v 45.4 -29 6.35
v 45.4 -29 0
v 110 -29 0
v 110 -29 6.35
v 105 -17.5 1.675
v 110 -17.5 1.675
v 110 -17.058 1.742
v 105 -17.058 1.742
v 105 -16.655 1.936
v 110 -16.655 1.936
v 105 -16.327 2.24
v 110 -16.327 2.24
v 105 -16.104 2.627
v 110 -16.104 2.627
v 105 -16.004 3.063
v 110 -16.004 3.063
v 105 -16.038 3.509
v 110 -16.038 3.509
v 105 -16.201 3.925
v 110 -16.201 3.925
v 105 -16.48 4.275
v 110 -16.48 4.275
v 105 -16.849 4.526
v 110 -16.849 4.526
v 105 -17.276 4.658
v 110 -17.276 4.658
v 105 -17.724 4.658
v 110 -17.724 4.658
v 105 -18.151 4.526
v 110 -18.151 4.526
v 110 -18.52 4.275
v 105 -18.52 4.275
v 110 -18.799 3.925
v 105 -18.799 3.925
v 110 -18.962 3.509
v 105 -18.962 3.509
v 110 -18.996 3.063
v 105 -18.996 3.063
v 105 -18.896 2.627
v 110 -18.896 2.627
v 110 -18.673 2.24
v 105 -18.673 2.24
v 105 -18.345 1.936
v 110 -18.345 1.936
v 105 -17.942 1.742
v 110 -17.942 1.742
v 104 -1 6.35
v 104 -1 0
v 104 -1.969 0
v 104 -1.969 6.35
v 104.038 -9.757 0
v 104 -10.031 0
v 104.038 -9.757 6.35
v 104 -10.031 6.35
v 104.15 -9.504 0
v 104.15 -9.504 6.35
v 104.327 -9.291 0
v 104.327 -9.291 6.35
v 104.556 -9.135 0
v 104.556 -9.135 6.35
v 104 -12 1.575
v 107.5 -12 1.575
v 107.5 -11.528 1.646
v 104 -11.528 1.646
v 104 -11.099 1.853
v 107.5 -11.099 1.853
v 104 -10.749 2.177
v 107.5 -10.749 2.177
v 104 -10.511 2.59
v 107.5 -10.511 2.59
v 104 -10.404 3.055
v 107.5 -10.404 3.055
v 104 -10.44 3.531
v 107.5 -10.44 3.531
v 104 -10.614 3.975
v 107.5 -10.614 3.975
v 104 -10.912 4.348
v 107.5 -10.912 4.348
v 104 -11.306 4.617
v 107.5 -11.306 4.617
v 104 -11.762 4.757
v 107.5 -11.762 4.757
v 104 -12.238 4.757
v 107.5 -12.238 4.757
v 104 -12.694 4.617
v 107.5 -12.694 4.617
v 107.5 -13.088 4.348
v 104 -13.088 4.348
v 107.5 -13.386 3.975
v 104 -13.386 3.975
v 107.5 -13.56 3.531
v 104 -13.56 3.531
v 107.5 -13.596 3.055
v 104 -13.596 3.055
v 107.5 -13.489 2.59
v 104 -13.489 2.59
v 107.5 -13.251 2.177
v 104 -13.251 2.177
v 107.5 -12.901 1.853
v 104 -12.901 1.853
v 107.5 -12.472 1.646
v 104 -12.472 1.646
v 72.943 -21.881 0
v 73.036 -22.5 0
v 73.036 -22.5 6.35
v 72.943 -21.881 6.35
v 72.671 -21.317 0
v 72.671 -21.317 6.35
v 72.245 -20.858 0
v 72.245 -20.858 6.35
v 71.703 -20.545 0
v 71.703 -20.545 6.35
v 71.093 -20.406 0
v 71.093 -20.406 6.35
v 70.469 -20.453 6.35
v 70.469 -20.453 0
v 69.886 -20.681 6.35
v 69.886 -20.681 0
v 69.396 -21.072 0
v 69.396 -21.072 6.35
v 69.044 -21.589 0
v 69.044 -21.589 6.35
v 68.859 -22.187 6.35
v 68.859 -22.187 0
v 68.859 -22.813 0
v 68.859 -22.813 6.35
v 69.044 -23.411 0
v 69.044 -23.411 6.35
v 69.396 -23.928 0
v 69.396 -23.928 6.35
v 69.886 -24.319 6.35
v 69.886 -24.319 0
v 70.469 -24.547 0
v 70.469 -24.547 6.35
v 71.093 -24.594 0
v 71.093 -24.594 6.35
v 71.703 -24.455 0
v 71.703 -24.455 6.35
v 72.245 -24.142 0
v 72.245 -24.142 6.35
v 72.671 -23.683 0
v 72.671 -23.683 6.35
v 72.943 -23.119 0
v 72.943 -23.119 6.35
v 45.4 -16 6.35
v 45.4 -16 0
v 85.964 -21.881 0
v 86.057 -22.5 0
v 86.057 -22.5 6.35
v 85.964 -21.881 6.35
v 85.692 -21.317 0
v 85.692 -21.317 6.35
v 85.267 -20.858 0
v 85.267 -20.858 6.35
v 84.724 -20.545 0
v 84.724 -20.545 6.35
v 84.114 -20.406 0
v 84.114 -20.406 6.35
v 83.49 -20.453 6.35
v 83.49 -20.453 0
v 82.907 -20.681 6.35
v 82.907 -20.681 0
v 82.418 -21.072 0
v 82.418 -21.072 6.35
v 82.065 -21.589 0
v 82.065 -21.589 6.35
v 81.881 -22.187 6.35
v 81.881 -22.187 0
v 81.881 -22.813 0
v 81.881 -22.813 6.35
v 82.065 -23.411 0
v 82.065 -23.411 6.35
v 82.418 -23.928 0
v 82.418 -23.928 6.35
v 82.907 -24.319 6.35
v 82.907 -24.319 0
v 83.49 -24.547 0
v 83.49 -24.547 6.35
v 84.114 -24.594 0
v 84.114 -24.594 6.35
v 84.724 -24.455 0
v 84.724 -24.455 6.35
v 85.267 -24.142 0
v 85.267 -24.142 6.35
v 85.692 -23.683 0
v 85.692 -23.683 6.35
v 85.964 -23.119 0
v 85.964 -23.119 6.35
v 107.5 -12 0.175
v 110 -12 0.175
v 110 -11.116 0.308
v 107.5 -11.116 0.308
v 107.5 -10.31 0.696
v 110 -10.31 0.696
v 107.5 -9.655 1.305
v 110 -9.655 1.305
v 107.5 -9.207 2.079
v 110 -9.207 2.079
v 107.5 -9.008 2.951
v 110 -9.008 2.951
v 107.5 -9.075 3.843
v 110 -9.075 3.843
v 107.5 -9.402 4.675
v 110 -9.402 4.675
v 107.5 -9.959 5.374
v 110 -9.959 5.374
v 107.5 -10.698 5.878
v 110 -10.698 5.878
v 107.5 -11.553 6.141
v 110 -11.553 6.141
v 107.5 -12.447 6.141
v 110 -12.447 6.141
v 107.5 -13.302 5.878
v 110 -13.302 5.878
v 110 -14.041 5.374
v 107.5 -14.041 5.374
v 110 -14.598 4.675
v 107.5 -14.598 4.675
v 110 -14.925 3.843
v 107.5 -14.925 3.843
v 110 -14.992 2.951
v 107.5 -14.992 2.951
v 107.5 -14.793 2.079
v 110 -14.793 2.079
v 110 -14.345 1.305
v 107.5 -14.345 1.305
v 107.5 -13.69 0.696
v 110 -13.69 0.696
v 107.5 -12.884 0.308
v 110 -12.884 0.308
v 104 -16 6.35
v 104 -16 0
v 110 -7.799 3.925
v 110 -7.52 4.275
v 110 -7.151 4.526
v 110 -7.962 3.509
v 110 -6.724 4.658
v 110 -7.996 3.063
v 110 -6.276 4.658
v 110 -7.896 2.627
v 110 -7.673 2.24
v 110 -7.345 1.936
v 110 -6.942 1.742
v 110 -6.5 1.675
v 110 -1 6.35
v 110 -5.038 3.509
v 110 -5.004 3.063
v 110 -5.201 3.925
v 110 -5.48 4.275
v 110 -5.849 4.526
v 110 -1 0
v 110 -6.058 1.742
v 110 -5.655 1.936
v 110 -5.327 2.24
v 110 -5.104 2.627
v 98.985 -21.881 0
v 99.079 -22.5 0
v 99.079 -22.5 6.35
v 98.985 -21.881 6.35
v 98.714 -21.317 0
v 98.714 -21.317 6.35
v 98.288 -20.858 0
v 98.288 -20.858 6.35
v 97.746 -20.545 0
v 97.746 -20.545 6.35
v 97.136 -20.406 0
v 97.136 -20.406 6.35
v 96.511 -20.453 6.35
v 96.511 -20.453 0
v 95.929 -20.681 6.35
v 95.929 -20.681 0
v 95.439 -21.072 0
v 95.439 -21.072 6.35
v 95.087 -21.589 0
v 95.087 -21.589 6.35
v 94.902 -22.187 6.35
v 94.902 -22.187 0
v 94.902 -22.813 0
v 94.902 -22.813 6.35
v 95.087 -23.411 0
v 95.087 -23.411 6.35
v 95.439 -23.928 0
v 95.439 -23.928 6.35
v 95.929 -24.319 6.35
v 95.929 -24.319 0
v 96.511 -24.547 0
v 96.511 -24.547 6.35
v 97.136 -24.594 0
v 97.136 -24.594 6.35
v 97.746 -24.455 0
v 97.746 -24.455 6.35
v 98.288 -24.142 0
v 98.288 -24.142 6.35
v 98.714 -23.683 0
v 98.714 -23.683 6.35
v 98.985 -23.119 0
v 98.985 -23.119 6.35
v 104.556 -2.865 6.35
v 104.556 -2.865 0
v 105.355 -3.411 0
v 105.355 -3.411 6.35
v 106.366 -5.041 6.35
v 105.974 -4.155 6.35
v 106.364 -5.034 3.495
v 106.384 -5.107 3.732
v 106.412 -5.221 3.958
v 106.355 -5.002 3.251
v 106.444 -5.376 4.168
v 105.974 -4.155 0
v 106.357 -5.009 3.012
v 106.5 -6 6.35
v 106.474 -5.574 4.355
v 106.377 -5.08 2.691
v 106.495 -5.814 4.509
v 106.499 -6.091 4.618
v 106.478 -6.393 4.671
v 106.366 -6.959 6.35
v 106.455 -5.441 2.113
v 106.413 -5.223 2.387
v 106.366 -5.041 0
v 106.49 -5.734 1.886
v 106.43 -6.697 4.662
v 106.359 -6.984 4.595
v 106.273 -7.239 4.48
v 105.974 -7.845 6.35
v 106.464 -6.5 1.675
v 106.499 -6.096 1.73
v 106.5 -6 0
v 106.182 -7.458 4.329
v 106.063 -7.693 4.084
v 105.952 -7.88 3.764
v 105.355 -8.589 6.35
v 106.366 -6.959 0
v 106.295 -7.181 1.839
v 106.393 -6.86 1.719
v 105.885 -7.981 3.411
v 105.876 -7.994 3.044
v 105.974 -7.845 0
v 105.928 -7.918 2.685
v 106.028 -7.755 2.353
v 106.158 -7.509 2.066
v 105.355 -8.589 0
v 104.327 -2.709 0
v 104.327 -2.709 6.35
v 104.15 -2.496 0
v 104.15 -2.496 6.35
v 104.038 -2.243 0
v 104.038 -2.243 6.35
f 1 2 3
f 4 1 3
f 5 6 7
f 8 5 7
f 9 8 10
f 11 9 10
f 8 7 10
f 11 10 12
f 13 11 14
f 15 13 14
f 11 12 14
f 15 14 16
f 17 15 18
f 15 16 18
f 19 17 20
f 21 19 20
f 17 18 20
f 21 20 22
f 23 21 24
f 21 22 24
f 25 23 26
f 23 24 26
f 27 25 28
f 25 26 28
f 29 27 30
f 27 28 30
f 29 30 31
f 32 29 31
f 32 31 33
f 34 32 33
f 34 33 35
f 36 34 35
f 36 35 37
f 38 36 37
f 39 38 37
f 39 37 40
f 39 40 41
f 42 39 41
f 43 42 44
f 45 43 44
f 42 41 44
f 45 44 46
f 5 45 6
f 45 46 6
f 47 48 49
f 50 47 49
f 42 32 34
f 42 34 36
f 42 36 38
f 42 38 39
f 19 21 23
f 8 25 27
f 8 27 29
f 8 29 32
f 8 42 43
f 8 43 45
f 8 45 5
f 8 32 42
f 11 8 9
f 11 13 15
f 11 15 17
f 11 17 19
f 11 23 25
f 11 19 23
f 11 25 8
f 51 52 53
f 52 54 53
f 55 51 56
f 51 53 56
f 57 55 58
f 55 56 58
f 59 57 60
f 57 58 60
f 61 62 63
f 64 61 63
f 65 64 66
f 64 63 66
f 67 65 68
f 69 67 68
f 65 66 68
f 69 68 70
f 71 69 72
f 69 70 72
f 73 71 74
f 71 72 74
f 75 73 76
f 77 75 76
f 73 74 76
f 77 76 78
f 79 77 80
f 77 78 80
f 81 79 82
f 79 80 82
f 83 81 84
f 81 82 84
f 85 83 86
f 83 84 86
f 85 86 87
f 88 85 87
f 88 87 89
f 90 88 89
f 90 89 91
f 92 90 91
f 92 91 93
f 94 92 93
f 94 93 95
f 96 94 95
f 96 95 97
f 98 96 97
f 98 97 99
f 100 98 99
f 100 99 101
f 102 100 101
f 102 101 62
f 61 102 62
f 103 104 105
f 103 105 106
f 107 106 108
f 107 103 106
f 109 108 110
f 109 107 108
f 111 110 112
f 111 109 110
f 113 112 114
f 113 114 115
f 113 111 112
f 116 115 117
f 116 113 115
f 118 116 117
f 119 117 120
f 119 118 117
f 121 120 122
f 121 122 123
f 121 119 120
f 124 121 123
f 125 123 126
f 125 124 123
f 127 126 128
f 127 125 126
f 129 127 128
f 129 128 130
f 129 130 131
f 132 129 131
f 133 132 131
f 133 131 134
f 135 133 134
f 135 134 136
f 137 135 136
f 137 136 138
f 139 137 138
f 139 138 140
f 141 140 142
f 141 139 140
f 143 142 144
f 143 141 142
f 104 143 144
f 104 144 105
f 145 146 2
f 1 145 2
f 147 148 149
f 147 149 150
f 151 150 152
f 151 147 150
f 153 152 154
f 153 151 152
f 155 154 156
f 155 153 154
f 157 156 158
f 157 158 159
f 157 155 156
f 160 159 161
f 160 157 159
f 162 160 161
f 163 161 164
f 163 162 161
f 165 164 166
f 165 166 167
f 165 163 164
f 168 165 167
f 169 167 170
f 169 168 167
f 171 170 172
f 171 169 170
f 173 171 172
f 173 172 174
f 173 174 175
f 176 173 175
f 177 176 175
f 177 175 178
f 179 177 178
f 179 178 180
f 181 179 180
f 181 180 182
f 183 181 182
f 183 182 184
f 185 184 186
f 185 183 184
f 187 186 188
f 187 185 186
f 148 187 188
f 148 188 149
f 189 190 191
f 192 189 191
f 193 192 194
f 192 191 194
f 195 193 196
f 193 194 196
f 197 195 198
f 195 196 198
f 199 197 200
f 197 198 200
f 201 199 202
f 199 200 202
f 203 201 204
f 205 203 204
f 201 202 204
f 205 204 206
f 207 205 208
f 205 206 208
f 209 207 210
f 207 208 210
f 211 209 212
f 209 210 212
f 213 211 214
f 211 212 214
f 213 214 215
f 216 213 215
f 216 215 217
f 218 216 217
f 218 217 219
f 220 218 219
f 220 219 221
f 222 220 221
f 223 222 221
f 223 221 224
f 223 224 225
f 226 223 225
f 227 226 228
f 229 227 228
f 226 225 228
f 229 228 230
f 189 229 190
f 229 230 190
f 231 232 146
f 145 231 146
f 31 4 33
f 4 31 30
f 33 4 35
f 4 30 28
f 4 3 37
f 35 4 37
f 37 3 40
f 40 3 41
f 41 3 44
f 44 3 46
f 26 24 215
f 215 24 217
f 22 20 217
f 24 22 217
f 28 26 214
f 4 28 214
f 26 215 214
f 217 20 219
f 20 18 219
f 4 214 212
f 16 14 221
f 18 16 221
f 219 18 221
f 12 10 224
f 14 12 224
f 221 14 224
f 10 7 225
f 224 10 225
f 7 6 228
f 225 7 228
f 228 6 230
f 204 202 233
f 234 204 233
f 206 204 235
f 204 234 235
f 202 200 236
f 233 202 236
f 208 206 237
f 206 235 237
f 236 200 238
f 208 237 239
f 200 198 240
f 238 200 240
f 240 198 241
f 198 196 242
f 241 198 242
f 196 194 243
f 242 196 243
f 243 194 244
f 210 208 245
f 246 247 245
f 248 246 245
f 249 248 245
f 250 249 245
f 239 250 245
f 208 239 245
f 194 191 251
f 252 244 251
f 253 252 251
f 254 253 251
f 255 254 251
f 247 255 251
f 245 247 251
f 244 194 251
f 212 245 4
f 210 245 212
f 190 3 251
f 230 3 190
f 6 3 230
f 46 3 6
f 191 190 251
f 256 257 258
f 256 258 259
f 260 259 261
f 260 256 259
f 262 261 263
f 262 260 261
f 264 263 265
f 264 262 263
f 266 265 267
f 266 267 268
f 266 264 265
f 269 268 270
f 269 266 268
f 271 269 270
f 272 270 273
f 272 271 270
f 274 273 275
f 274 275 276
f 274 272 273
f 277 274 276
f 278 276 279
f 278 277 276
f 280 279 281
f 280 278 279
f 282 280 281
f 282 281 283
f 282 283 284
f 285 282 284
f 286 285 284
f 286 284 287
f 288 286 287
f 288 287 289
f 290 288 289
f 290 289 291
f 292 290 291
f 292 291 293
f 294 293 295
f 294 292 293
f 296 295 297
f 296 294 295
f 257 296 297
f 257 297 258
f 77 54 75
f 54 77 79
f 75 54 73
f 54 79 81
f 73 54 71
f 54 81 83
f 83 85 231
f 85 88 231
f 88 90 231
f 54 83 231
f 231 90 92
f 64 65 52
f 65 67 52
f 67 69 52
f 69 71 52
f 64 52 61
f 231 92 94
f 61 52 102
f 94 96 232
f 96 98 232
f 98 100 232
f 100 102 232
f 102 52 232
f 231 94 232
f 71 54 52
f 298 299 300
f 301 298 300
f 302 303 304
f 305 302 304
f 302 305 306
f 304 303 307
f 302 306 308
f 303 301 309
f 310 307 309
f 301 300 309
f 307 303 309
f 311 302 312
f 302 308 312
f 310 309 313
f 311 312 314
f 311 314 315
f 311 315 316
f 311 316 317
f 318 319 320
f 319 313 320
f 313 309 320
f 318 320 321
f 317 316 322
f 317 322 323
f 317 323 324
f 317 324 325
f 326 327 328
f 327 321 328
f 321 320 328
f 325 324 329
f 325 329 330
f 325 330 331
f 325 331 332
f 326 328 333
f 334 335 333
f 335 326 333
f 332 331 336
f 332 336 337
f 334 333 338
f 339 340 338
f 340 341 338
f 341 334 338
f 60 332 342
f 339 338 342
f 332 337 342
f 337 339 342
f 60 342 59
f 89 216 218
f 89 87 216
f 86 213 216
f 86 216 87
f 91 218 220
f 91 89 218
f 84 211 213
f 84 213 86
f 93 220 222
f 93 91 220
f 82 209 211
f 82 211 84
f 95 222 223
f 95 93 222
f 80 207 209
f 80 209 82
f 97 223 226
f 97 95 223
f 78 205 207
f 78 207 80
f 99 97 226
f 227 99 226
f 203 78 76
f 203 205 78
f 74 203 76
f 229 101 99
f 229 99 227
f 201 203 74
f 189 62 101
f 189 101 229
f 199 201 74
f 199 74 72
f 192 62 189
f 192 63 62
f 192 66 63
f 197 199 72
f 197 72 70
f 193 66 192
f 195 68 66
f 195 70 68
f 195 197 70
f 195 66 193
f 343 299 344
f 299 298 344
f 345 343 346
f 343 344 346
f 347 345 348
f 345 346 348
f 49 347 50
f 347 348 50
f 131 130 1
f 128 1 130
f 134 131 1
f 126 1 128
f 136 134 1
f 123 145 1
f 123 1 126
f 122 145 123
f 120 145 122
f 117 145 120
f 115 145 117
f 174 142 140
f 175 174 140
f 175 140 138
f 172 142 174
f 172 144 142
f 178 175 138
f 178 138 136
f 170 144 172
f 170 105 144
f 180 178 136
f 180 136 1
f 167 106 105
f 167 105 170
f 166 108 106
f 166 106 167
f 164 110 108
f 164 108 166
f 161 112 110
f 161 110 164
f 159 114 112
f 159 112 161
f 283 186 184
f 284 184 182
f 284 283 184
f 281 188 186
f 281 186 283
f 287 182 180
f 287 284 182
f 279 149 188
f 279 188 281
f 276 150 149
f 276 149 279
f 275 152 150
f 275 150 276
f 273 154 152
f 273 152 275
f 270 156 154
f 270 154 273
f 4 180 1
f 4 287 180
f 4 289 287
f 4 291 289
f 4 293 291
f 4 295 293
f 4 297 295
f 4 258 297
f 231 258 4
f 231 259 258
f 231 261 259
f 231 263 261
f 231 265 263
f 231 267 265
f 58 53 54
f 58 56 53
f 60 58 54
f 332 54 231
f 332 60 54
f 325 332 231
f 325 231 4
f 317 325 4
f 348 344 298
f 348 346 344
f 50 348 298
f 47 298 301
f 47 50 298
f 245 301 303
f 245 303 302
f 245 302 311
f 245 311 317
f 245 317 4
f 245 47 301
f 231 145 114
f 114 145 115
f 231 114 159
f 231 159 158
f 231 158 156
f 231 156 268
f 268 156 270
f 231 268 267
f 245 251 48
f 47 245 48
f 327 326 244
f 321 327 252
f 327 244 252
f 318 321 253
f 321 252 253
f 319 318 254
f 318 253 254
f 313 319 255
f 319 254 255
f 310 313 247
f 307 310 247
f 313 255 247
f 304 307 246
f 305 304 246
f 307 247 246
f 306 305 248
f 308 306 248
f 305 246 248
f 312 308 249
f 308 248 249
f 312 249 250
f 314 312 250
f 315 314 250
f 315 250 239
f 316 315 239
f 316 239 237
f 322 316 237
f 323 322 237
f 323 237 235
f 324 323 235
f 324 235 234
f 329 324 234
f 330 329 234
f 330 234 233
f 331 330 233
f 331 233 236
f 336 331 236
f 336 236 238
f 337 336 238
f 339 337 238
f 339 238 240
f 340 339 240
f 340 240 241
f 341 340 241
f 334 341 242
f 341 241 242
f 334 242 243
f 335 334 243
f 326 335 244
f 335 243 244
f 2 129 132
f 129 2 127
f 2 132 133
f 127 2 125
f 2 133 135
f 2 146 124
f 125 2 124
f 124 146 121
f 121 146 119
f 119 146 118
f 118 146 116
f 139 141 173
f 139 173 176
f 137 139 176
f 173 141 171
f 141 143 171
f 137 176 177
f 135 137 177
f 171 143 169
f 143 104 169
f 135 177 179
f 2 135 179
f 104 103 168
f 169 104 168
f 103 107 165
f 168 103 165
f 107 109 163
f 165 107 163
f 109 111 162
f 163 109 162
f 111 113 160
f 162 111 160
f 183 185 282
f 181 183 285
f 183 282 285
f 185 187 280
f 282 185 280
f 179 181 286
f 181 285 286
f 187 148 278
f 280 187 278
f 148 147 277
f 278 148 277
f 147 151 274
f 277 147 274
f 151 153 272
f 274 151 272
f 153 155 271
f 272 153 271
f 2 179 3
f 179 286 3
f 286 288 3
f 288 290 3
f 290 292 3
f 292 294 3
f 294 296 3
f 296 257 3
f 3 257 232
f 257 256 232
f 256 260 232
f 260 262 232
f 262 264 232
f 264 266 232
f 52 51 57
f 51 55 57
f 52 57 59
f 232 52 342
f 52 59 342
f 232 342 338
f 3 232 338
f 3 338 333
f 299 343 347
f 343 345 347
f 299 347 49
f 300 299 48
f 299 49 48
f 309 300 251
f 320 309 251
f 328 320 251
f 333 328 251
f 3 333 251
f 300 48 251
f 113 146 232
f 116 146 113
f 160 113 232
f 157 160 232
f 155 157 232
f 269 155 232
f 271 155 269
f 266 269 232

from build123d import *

# Parameters (mm, degrees)
SKETCH1_R           = 2.1
BOSS_EXTRUDE1_DEPTH = 6.35
SKETCH2_R           = 1.6
CUT_EXTRUDE1_DEPTH  = 65.6
SKETCH3_R           = 3
CUT_EXTRUDE2_DEPTH  = 2.5
SKETCH4_R           = 1.5
CUT_EXTRUDE3_DEPTH  = 5
FILLET1_R           = 1


with BuildPart() as part:
    # Sketch1 → Boss-Extrude1 (new body)
    with BuildSketch(Plane.XY):
        with BuildLine():
            Line((45.4, -16), (45.4, -29))
            Line((45.4, -29), (110, -29))
            Line((110, -29), (110, -1))
            Line((110, -1), (104, -1))
            Line((104, -1), (104, -2.645898034))
            ThreePointArc((104, -2.645898034), (106.5, -6), (104, -9.354101966))
            Line((104, -9.354101966), (104, -16))
            Line((104, -16), (99, -16))
            Line((99, -16), (45.4, -16))
        make_face()
        with Locations((96.978626472, -22.5)):
            Circle(SKETCH1_R, mode=Mode.SUBTRACT)
        with Locations((83.957252945, -22.5)):
            Circle(SKETCH1_R, mode=Mode.SUBTRACT)
        with Locations((70.935879417, -22.5)):
            Circle(SKETCH1_R, mode=Mode.SUBTRACT)
    extrude(amount=BOSS_EXTRUDE1_DEPTH)

    # Sketch2 → Cut-Extrude1 (cut, through all)
    with BuildSketch(Plane(origin=(110, 0, 0), x_dir=(0, 0, -1), z_dir=(1, 0, 0))):
        with Locations((-3.175, -12)):
            Circle(SKETCH2_R)
    extrude(amount=-CUT_EXTRUDE1_DEPTH, mode=Mode.SUBTRACT)

    # Sketch3 → Cut-Extrude2 (cut)
    with BuildSketch(Plane(origin=(110, 0, 0), x_dir=(0, 0, -1), z_dir=(1, 0, 0))):
        with Locations((-3.175, -12)):
            Circle(SKETCH3_R)
    extrude(amount=-CUT_EXTRUDE2_DEPTH, mode=Mode.SUBTRACT)

    # Sketch4 → Cut-Extrude3 (cut)
    with BuildSketch(Plane(origin=(110, 0, 0), x_dir=(0, 0, -1), z_dir=(1, 0, 0))):
        with Locations((-3.175, -17.5)):
            Circle(SKETCH4_R)
        with Locations((-3.175, -6.5)):
            Circle(SKETCH4_R)
    extrude(amount=-CUT_EXTRUDE3_DEPTH, mode=Mode.SUBTRACT)

    # Fillet1
    fillet1_edges = [part.edges().sort_by_distance(p)[0] for p in [
        (104, -9.354101966, 3.175),
        (104, -2.645898034, 3.175),
    ]]
    fillet(fillet1_edges, radius=FILLET1_R)


solid = part.part
